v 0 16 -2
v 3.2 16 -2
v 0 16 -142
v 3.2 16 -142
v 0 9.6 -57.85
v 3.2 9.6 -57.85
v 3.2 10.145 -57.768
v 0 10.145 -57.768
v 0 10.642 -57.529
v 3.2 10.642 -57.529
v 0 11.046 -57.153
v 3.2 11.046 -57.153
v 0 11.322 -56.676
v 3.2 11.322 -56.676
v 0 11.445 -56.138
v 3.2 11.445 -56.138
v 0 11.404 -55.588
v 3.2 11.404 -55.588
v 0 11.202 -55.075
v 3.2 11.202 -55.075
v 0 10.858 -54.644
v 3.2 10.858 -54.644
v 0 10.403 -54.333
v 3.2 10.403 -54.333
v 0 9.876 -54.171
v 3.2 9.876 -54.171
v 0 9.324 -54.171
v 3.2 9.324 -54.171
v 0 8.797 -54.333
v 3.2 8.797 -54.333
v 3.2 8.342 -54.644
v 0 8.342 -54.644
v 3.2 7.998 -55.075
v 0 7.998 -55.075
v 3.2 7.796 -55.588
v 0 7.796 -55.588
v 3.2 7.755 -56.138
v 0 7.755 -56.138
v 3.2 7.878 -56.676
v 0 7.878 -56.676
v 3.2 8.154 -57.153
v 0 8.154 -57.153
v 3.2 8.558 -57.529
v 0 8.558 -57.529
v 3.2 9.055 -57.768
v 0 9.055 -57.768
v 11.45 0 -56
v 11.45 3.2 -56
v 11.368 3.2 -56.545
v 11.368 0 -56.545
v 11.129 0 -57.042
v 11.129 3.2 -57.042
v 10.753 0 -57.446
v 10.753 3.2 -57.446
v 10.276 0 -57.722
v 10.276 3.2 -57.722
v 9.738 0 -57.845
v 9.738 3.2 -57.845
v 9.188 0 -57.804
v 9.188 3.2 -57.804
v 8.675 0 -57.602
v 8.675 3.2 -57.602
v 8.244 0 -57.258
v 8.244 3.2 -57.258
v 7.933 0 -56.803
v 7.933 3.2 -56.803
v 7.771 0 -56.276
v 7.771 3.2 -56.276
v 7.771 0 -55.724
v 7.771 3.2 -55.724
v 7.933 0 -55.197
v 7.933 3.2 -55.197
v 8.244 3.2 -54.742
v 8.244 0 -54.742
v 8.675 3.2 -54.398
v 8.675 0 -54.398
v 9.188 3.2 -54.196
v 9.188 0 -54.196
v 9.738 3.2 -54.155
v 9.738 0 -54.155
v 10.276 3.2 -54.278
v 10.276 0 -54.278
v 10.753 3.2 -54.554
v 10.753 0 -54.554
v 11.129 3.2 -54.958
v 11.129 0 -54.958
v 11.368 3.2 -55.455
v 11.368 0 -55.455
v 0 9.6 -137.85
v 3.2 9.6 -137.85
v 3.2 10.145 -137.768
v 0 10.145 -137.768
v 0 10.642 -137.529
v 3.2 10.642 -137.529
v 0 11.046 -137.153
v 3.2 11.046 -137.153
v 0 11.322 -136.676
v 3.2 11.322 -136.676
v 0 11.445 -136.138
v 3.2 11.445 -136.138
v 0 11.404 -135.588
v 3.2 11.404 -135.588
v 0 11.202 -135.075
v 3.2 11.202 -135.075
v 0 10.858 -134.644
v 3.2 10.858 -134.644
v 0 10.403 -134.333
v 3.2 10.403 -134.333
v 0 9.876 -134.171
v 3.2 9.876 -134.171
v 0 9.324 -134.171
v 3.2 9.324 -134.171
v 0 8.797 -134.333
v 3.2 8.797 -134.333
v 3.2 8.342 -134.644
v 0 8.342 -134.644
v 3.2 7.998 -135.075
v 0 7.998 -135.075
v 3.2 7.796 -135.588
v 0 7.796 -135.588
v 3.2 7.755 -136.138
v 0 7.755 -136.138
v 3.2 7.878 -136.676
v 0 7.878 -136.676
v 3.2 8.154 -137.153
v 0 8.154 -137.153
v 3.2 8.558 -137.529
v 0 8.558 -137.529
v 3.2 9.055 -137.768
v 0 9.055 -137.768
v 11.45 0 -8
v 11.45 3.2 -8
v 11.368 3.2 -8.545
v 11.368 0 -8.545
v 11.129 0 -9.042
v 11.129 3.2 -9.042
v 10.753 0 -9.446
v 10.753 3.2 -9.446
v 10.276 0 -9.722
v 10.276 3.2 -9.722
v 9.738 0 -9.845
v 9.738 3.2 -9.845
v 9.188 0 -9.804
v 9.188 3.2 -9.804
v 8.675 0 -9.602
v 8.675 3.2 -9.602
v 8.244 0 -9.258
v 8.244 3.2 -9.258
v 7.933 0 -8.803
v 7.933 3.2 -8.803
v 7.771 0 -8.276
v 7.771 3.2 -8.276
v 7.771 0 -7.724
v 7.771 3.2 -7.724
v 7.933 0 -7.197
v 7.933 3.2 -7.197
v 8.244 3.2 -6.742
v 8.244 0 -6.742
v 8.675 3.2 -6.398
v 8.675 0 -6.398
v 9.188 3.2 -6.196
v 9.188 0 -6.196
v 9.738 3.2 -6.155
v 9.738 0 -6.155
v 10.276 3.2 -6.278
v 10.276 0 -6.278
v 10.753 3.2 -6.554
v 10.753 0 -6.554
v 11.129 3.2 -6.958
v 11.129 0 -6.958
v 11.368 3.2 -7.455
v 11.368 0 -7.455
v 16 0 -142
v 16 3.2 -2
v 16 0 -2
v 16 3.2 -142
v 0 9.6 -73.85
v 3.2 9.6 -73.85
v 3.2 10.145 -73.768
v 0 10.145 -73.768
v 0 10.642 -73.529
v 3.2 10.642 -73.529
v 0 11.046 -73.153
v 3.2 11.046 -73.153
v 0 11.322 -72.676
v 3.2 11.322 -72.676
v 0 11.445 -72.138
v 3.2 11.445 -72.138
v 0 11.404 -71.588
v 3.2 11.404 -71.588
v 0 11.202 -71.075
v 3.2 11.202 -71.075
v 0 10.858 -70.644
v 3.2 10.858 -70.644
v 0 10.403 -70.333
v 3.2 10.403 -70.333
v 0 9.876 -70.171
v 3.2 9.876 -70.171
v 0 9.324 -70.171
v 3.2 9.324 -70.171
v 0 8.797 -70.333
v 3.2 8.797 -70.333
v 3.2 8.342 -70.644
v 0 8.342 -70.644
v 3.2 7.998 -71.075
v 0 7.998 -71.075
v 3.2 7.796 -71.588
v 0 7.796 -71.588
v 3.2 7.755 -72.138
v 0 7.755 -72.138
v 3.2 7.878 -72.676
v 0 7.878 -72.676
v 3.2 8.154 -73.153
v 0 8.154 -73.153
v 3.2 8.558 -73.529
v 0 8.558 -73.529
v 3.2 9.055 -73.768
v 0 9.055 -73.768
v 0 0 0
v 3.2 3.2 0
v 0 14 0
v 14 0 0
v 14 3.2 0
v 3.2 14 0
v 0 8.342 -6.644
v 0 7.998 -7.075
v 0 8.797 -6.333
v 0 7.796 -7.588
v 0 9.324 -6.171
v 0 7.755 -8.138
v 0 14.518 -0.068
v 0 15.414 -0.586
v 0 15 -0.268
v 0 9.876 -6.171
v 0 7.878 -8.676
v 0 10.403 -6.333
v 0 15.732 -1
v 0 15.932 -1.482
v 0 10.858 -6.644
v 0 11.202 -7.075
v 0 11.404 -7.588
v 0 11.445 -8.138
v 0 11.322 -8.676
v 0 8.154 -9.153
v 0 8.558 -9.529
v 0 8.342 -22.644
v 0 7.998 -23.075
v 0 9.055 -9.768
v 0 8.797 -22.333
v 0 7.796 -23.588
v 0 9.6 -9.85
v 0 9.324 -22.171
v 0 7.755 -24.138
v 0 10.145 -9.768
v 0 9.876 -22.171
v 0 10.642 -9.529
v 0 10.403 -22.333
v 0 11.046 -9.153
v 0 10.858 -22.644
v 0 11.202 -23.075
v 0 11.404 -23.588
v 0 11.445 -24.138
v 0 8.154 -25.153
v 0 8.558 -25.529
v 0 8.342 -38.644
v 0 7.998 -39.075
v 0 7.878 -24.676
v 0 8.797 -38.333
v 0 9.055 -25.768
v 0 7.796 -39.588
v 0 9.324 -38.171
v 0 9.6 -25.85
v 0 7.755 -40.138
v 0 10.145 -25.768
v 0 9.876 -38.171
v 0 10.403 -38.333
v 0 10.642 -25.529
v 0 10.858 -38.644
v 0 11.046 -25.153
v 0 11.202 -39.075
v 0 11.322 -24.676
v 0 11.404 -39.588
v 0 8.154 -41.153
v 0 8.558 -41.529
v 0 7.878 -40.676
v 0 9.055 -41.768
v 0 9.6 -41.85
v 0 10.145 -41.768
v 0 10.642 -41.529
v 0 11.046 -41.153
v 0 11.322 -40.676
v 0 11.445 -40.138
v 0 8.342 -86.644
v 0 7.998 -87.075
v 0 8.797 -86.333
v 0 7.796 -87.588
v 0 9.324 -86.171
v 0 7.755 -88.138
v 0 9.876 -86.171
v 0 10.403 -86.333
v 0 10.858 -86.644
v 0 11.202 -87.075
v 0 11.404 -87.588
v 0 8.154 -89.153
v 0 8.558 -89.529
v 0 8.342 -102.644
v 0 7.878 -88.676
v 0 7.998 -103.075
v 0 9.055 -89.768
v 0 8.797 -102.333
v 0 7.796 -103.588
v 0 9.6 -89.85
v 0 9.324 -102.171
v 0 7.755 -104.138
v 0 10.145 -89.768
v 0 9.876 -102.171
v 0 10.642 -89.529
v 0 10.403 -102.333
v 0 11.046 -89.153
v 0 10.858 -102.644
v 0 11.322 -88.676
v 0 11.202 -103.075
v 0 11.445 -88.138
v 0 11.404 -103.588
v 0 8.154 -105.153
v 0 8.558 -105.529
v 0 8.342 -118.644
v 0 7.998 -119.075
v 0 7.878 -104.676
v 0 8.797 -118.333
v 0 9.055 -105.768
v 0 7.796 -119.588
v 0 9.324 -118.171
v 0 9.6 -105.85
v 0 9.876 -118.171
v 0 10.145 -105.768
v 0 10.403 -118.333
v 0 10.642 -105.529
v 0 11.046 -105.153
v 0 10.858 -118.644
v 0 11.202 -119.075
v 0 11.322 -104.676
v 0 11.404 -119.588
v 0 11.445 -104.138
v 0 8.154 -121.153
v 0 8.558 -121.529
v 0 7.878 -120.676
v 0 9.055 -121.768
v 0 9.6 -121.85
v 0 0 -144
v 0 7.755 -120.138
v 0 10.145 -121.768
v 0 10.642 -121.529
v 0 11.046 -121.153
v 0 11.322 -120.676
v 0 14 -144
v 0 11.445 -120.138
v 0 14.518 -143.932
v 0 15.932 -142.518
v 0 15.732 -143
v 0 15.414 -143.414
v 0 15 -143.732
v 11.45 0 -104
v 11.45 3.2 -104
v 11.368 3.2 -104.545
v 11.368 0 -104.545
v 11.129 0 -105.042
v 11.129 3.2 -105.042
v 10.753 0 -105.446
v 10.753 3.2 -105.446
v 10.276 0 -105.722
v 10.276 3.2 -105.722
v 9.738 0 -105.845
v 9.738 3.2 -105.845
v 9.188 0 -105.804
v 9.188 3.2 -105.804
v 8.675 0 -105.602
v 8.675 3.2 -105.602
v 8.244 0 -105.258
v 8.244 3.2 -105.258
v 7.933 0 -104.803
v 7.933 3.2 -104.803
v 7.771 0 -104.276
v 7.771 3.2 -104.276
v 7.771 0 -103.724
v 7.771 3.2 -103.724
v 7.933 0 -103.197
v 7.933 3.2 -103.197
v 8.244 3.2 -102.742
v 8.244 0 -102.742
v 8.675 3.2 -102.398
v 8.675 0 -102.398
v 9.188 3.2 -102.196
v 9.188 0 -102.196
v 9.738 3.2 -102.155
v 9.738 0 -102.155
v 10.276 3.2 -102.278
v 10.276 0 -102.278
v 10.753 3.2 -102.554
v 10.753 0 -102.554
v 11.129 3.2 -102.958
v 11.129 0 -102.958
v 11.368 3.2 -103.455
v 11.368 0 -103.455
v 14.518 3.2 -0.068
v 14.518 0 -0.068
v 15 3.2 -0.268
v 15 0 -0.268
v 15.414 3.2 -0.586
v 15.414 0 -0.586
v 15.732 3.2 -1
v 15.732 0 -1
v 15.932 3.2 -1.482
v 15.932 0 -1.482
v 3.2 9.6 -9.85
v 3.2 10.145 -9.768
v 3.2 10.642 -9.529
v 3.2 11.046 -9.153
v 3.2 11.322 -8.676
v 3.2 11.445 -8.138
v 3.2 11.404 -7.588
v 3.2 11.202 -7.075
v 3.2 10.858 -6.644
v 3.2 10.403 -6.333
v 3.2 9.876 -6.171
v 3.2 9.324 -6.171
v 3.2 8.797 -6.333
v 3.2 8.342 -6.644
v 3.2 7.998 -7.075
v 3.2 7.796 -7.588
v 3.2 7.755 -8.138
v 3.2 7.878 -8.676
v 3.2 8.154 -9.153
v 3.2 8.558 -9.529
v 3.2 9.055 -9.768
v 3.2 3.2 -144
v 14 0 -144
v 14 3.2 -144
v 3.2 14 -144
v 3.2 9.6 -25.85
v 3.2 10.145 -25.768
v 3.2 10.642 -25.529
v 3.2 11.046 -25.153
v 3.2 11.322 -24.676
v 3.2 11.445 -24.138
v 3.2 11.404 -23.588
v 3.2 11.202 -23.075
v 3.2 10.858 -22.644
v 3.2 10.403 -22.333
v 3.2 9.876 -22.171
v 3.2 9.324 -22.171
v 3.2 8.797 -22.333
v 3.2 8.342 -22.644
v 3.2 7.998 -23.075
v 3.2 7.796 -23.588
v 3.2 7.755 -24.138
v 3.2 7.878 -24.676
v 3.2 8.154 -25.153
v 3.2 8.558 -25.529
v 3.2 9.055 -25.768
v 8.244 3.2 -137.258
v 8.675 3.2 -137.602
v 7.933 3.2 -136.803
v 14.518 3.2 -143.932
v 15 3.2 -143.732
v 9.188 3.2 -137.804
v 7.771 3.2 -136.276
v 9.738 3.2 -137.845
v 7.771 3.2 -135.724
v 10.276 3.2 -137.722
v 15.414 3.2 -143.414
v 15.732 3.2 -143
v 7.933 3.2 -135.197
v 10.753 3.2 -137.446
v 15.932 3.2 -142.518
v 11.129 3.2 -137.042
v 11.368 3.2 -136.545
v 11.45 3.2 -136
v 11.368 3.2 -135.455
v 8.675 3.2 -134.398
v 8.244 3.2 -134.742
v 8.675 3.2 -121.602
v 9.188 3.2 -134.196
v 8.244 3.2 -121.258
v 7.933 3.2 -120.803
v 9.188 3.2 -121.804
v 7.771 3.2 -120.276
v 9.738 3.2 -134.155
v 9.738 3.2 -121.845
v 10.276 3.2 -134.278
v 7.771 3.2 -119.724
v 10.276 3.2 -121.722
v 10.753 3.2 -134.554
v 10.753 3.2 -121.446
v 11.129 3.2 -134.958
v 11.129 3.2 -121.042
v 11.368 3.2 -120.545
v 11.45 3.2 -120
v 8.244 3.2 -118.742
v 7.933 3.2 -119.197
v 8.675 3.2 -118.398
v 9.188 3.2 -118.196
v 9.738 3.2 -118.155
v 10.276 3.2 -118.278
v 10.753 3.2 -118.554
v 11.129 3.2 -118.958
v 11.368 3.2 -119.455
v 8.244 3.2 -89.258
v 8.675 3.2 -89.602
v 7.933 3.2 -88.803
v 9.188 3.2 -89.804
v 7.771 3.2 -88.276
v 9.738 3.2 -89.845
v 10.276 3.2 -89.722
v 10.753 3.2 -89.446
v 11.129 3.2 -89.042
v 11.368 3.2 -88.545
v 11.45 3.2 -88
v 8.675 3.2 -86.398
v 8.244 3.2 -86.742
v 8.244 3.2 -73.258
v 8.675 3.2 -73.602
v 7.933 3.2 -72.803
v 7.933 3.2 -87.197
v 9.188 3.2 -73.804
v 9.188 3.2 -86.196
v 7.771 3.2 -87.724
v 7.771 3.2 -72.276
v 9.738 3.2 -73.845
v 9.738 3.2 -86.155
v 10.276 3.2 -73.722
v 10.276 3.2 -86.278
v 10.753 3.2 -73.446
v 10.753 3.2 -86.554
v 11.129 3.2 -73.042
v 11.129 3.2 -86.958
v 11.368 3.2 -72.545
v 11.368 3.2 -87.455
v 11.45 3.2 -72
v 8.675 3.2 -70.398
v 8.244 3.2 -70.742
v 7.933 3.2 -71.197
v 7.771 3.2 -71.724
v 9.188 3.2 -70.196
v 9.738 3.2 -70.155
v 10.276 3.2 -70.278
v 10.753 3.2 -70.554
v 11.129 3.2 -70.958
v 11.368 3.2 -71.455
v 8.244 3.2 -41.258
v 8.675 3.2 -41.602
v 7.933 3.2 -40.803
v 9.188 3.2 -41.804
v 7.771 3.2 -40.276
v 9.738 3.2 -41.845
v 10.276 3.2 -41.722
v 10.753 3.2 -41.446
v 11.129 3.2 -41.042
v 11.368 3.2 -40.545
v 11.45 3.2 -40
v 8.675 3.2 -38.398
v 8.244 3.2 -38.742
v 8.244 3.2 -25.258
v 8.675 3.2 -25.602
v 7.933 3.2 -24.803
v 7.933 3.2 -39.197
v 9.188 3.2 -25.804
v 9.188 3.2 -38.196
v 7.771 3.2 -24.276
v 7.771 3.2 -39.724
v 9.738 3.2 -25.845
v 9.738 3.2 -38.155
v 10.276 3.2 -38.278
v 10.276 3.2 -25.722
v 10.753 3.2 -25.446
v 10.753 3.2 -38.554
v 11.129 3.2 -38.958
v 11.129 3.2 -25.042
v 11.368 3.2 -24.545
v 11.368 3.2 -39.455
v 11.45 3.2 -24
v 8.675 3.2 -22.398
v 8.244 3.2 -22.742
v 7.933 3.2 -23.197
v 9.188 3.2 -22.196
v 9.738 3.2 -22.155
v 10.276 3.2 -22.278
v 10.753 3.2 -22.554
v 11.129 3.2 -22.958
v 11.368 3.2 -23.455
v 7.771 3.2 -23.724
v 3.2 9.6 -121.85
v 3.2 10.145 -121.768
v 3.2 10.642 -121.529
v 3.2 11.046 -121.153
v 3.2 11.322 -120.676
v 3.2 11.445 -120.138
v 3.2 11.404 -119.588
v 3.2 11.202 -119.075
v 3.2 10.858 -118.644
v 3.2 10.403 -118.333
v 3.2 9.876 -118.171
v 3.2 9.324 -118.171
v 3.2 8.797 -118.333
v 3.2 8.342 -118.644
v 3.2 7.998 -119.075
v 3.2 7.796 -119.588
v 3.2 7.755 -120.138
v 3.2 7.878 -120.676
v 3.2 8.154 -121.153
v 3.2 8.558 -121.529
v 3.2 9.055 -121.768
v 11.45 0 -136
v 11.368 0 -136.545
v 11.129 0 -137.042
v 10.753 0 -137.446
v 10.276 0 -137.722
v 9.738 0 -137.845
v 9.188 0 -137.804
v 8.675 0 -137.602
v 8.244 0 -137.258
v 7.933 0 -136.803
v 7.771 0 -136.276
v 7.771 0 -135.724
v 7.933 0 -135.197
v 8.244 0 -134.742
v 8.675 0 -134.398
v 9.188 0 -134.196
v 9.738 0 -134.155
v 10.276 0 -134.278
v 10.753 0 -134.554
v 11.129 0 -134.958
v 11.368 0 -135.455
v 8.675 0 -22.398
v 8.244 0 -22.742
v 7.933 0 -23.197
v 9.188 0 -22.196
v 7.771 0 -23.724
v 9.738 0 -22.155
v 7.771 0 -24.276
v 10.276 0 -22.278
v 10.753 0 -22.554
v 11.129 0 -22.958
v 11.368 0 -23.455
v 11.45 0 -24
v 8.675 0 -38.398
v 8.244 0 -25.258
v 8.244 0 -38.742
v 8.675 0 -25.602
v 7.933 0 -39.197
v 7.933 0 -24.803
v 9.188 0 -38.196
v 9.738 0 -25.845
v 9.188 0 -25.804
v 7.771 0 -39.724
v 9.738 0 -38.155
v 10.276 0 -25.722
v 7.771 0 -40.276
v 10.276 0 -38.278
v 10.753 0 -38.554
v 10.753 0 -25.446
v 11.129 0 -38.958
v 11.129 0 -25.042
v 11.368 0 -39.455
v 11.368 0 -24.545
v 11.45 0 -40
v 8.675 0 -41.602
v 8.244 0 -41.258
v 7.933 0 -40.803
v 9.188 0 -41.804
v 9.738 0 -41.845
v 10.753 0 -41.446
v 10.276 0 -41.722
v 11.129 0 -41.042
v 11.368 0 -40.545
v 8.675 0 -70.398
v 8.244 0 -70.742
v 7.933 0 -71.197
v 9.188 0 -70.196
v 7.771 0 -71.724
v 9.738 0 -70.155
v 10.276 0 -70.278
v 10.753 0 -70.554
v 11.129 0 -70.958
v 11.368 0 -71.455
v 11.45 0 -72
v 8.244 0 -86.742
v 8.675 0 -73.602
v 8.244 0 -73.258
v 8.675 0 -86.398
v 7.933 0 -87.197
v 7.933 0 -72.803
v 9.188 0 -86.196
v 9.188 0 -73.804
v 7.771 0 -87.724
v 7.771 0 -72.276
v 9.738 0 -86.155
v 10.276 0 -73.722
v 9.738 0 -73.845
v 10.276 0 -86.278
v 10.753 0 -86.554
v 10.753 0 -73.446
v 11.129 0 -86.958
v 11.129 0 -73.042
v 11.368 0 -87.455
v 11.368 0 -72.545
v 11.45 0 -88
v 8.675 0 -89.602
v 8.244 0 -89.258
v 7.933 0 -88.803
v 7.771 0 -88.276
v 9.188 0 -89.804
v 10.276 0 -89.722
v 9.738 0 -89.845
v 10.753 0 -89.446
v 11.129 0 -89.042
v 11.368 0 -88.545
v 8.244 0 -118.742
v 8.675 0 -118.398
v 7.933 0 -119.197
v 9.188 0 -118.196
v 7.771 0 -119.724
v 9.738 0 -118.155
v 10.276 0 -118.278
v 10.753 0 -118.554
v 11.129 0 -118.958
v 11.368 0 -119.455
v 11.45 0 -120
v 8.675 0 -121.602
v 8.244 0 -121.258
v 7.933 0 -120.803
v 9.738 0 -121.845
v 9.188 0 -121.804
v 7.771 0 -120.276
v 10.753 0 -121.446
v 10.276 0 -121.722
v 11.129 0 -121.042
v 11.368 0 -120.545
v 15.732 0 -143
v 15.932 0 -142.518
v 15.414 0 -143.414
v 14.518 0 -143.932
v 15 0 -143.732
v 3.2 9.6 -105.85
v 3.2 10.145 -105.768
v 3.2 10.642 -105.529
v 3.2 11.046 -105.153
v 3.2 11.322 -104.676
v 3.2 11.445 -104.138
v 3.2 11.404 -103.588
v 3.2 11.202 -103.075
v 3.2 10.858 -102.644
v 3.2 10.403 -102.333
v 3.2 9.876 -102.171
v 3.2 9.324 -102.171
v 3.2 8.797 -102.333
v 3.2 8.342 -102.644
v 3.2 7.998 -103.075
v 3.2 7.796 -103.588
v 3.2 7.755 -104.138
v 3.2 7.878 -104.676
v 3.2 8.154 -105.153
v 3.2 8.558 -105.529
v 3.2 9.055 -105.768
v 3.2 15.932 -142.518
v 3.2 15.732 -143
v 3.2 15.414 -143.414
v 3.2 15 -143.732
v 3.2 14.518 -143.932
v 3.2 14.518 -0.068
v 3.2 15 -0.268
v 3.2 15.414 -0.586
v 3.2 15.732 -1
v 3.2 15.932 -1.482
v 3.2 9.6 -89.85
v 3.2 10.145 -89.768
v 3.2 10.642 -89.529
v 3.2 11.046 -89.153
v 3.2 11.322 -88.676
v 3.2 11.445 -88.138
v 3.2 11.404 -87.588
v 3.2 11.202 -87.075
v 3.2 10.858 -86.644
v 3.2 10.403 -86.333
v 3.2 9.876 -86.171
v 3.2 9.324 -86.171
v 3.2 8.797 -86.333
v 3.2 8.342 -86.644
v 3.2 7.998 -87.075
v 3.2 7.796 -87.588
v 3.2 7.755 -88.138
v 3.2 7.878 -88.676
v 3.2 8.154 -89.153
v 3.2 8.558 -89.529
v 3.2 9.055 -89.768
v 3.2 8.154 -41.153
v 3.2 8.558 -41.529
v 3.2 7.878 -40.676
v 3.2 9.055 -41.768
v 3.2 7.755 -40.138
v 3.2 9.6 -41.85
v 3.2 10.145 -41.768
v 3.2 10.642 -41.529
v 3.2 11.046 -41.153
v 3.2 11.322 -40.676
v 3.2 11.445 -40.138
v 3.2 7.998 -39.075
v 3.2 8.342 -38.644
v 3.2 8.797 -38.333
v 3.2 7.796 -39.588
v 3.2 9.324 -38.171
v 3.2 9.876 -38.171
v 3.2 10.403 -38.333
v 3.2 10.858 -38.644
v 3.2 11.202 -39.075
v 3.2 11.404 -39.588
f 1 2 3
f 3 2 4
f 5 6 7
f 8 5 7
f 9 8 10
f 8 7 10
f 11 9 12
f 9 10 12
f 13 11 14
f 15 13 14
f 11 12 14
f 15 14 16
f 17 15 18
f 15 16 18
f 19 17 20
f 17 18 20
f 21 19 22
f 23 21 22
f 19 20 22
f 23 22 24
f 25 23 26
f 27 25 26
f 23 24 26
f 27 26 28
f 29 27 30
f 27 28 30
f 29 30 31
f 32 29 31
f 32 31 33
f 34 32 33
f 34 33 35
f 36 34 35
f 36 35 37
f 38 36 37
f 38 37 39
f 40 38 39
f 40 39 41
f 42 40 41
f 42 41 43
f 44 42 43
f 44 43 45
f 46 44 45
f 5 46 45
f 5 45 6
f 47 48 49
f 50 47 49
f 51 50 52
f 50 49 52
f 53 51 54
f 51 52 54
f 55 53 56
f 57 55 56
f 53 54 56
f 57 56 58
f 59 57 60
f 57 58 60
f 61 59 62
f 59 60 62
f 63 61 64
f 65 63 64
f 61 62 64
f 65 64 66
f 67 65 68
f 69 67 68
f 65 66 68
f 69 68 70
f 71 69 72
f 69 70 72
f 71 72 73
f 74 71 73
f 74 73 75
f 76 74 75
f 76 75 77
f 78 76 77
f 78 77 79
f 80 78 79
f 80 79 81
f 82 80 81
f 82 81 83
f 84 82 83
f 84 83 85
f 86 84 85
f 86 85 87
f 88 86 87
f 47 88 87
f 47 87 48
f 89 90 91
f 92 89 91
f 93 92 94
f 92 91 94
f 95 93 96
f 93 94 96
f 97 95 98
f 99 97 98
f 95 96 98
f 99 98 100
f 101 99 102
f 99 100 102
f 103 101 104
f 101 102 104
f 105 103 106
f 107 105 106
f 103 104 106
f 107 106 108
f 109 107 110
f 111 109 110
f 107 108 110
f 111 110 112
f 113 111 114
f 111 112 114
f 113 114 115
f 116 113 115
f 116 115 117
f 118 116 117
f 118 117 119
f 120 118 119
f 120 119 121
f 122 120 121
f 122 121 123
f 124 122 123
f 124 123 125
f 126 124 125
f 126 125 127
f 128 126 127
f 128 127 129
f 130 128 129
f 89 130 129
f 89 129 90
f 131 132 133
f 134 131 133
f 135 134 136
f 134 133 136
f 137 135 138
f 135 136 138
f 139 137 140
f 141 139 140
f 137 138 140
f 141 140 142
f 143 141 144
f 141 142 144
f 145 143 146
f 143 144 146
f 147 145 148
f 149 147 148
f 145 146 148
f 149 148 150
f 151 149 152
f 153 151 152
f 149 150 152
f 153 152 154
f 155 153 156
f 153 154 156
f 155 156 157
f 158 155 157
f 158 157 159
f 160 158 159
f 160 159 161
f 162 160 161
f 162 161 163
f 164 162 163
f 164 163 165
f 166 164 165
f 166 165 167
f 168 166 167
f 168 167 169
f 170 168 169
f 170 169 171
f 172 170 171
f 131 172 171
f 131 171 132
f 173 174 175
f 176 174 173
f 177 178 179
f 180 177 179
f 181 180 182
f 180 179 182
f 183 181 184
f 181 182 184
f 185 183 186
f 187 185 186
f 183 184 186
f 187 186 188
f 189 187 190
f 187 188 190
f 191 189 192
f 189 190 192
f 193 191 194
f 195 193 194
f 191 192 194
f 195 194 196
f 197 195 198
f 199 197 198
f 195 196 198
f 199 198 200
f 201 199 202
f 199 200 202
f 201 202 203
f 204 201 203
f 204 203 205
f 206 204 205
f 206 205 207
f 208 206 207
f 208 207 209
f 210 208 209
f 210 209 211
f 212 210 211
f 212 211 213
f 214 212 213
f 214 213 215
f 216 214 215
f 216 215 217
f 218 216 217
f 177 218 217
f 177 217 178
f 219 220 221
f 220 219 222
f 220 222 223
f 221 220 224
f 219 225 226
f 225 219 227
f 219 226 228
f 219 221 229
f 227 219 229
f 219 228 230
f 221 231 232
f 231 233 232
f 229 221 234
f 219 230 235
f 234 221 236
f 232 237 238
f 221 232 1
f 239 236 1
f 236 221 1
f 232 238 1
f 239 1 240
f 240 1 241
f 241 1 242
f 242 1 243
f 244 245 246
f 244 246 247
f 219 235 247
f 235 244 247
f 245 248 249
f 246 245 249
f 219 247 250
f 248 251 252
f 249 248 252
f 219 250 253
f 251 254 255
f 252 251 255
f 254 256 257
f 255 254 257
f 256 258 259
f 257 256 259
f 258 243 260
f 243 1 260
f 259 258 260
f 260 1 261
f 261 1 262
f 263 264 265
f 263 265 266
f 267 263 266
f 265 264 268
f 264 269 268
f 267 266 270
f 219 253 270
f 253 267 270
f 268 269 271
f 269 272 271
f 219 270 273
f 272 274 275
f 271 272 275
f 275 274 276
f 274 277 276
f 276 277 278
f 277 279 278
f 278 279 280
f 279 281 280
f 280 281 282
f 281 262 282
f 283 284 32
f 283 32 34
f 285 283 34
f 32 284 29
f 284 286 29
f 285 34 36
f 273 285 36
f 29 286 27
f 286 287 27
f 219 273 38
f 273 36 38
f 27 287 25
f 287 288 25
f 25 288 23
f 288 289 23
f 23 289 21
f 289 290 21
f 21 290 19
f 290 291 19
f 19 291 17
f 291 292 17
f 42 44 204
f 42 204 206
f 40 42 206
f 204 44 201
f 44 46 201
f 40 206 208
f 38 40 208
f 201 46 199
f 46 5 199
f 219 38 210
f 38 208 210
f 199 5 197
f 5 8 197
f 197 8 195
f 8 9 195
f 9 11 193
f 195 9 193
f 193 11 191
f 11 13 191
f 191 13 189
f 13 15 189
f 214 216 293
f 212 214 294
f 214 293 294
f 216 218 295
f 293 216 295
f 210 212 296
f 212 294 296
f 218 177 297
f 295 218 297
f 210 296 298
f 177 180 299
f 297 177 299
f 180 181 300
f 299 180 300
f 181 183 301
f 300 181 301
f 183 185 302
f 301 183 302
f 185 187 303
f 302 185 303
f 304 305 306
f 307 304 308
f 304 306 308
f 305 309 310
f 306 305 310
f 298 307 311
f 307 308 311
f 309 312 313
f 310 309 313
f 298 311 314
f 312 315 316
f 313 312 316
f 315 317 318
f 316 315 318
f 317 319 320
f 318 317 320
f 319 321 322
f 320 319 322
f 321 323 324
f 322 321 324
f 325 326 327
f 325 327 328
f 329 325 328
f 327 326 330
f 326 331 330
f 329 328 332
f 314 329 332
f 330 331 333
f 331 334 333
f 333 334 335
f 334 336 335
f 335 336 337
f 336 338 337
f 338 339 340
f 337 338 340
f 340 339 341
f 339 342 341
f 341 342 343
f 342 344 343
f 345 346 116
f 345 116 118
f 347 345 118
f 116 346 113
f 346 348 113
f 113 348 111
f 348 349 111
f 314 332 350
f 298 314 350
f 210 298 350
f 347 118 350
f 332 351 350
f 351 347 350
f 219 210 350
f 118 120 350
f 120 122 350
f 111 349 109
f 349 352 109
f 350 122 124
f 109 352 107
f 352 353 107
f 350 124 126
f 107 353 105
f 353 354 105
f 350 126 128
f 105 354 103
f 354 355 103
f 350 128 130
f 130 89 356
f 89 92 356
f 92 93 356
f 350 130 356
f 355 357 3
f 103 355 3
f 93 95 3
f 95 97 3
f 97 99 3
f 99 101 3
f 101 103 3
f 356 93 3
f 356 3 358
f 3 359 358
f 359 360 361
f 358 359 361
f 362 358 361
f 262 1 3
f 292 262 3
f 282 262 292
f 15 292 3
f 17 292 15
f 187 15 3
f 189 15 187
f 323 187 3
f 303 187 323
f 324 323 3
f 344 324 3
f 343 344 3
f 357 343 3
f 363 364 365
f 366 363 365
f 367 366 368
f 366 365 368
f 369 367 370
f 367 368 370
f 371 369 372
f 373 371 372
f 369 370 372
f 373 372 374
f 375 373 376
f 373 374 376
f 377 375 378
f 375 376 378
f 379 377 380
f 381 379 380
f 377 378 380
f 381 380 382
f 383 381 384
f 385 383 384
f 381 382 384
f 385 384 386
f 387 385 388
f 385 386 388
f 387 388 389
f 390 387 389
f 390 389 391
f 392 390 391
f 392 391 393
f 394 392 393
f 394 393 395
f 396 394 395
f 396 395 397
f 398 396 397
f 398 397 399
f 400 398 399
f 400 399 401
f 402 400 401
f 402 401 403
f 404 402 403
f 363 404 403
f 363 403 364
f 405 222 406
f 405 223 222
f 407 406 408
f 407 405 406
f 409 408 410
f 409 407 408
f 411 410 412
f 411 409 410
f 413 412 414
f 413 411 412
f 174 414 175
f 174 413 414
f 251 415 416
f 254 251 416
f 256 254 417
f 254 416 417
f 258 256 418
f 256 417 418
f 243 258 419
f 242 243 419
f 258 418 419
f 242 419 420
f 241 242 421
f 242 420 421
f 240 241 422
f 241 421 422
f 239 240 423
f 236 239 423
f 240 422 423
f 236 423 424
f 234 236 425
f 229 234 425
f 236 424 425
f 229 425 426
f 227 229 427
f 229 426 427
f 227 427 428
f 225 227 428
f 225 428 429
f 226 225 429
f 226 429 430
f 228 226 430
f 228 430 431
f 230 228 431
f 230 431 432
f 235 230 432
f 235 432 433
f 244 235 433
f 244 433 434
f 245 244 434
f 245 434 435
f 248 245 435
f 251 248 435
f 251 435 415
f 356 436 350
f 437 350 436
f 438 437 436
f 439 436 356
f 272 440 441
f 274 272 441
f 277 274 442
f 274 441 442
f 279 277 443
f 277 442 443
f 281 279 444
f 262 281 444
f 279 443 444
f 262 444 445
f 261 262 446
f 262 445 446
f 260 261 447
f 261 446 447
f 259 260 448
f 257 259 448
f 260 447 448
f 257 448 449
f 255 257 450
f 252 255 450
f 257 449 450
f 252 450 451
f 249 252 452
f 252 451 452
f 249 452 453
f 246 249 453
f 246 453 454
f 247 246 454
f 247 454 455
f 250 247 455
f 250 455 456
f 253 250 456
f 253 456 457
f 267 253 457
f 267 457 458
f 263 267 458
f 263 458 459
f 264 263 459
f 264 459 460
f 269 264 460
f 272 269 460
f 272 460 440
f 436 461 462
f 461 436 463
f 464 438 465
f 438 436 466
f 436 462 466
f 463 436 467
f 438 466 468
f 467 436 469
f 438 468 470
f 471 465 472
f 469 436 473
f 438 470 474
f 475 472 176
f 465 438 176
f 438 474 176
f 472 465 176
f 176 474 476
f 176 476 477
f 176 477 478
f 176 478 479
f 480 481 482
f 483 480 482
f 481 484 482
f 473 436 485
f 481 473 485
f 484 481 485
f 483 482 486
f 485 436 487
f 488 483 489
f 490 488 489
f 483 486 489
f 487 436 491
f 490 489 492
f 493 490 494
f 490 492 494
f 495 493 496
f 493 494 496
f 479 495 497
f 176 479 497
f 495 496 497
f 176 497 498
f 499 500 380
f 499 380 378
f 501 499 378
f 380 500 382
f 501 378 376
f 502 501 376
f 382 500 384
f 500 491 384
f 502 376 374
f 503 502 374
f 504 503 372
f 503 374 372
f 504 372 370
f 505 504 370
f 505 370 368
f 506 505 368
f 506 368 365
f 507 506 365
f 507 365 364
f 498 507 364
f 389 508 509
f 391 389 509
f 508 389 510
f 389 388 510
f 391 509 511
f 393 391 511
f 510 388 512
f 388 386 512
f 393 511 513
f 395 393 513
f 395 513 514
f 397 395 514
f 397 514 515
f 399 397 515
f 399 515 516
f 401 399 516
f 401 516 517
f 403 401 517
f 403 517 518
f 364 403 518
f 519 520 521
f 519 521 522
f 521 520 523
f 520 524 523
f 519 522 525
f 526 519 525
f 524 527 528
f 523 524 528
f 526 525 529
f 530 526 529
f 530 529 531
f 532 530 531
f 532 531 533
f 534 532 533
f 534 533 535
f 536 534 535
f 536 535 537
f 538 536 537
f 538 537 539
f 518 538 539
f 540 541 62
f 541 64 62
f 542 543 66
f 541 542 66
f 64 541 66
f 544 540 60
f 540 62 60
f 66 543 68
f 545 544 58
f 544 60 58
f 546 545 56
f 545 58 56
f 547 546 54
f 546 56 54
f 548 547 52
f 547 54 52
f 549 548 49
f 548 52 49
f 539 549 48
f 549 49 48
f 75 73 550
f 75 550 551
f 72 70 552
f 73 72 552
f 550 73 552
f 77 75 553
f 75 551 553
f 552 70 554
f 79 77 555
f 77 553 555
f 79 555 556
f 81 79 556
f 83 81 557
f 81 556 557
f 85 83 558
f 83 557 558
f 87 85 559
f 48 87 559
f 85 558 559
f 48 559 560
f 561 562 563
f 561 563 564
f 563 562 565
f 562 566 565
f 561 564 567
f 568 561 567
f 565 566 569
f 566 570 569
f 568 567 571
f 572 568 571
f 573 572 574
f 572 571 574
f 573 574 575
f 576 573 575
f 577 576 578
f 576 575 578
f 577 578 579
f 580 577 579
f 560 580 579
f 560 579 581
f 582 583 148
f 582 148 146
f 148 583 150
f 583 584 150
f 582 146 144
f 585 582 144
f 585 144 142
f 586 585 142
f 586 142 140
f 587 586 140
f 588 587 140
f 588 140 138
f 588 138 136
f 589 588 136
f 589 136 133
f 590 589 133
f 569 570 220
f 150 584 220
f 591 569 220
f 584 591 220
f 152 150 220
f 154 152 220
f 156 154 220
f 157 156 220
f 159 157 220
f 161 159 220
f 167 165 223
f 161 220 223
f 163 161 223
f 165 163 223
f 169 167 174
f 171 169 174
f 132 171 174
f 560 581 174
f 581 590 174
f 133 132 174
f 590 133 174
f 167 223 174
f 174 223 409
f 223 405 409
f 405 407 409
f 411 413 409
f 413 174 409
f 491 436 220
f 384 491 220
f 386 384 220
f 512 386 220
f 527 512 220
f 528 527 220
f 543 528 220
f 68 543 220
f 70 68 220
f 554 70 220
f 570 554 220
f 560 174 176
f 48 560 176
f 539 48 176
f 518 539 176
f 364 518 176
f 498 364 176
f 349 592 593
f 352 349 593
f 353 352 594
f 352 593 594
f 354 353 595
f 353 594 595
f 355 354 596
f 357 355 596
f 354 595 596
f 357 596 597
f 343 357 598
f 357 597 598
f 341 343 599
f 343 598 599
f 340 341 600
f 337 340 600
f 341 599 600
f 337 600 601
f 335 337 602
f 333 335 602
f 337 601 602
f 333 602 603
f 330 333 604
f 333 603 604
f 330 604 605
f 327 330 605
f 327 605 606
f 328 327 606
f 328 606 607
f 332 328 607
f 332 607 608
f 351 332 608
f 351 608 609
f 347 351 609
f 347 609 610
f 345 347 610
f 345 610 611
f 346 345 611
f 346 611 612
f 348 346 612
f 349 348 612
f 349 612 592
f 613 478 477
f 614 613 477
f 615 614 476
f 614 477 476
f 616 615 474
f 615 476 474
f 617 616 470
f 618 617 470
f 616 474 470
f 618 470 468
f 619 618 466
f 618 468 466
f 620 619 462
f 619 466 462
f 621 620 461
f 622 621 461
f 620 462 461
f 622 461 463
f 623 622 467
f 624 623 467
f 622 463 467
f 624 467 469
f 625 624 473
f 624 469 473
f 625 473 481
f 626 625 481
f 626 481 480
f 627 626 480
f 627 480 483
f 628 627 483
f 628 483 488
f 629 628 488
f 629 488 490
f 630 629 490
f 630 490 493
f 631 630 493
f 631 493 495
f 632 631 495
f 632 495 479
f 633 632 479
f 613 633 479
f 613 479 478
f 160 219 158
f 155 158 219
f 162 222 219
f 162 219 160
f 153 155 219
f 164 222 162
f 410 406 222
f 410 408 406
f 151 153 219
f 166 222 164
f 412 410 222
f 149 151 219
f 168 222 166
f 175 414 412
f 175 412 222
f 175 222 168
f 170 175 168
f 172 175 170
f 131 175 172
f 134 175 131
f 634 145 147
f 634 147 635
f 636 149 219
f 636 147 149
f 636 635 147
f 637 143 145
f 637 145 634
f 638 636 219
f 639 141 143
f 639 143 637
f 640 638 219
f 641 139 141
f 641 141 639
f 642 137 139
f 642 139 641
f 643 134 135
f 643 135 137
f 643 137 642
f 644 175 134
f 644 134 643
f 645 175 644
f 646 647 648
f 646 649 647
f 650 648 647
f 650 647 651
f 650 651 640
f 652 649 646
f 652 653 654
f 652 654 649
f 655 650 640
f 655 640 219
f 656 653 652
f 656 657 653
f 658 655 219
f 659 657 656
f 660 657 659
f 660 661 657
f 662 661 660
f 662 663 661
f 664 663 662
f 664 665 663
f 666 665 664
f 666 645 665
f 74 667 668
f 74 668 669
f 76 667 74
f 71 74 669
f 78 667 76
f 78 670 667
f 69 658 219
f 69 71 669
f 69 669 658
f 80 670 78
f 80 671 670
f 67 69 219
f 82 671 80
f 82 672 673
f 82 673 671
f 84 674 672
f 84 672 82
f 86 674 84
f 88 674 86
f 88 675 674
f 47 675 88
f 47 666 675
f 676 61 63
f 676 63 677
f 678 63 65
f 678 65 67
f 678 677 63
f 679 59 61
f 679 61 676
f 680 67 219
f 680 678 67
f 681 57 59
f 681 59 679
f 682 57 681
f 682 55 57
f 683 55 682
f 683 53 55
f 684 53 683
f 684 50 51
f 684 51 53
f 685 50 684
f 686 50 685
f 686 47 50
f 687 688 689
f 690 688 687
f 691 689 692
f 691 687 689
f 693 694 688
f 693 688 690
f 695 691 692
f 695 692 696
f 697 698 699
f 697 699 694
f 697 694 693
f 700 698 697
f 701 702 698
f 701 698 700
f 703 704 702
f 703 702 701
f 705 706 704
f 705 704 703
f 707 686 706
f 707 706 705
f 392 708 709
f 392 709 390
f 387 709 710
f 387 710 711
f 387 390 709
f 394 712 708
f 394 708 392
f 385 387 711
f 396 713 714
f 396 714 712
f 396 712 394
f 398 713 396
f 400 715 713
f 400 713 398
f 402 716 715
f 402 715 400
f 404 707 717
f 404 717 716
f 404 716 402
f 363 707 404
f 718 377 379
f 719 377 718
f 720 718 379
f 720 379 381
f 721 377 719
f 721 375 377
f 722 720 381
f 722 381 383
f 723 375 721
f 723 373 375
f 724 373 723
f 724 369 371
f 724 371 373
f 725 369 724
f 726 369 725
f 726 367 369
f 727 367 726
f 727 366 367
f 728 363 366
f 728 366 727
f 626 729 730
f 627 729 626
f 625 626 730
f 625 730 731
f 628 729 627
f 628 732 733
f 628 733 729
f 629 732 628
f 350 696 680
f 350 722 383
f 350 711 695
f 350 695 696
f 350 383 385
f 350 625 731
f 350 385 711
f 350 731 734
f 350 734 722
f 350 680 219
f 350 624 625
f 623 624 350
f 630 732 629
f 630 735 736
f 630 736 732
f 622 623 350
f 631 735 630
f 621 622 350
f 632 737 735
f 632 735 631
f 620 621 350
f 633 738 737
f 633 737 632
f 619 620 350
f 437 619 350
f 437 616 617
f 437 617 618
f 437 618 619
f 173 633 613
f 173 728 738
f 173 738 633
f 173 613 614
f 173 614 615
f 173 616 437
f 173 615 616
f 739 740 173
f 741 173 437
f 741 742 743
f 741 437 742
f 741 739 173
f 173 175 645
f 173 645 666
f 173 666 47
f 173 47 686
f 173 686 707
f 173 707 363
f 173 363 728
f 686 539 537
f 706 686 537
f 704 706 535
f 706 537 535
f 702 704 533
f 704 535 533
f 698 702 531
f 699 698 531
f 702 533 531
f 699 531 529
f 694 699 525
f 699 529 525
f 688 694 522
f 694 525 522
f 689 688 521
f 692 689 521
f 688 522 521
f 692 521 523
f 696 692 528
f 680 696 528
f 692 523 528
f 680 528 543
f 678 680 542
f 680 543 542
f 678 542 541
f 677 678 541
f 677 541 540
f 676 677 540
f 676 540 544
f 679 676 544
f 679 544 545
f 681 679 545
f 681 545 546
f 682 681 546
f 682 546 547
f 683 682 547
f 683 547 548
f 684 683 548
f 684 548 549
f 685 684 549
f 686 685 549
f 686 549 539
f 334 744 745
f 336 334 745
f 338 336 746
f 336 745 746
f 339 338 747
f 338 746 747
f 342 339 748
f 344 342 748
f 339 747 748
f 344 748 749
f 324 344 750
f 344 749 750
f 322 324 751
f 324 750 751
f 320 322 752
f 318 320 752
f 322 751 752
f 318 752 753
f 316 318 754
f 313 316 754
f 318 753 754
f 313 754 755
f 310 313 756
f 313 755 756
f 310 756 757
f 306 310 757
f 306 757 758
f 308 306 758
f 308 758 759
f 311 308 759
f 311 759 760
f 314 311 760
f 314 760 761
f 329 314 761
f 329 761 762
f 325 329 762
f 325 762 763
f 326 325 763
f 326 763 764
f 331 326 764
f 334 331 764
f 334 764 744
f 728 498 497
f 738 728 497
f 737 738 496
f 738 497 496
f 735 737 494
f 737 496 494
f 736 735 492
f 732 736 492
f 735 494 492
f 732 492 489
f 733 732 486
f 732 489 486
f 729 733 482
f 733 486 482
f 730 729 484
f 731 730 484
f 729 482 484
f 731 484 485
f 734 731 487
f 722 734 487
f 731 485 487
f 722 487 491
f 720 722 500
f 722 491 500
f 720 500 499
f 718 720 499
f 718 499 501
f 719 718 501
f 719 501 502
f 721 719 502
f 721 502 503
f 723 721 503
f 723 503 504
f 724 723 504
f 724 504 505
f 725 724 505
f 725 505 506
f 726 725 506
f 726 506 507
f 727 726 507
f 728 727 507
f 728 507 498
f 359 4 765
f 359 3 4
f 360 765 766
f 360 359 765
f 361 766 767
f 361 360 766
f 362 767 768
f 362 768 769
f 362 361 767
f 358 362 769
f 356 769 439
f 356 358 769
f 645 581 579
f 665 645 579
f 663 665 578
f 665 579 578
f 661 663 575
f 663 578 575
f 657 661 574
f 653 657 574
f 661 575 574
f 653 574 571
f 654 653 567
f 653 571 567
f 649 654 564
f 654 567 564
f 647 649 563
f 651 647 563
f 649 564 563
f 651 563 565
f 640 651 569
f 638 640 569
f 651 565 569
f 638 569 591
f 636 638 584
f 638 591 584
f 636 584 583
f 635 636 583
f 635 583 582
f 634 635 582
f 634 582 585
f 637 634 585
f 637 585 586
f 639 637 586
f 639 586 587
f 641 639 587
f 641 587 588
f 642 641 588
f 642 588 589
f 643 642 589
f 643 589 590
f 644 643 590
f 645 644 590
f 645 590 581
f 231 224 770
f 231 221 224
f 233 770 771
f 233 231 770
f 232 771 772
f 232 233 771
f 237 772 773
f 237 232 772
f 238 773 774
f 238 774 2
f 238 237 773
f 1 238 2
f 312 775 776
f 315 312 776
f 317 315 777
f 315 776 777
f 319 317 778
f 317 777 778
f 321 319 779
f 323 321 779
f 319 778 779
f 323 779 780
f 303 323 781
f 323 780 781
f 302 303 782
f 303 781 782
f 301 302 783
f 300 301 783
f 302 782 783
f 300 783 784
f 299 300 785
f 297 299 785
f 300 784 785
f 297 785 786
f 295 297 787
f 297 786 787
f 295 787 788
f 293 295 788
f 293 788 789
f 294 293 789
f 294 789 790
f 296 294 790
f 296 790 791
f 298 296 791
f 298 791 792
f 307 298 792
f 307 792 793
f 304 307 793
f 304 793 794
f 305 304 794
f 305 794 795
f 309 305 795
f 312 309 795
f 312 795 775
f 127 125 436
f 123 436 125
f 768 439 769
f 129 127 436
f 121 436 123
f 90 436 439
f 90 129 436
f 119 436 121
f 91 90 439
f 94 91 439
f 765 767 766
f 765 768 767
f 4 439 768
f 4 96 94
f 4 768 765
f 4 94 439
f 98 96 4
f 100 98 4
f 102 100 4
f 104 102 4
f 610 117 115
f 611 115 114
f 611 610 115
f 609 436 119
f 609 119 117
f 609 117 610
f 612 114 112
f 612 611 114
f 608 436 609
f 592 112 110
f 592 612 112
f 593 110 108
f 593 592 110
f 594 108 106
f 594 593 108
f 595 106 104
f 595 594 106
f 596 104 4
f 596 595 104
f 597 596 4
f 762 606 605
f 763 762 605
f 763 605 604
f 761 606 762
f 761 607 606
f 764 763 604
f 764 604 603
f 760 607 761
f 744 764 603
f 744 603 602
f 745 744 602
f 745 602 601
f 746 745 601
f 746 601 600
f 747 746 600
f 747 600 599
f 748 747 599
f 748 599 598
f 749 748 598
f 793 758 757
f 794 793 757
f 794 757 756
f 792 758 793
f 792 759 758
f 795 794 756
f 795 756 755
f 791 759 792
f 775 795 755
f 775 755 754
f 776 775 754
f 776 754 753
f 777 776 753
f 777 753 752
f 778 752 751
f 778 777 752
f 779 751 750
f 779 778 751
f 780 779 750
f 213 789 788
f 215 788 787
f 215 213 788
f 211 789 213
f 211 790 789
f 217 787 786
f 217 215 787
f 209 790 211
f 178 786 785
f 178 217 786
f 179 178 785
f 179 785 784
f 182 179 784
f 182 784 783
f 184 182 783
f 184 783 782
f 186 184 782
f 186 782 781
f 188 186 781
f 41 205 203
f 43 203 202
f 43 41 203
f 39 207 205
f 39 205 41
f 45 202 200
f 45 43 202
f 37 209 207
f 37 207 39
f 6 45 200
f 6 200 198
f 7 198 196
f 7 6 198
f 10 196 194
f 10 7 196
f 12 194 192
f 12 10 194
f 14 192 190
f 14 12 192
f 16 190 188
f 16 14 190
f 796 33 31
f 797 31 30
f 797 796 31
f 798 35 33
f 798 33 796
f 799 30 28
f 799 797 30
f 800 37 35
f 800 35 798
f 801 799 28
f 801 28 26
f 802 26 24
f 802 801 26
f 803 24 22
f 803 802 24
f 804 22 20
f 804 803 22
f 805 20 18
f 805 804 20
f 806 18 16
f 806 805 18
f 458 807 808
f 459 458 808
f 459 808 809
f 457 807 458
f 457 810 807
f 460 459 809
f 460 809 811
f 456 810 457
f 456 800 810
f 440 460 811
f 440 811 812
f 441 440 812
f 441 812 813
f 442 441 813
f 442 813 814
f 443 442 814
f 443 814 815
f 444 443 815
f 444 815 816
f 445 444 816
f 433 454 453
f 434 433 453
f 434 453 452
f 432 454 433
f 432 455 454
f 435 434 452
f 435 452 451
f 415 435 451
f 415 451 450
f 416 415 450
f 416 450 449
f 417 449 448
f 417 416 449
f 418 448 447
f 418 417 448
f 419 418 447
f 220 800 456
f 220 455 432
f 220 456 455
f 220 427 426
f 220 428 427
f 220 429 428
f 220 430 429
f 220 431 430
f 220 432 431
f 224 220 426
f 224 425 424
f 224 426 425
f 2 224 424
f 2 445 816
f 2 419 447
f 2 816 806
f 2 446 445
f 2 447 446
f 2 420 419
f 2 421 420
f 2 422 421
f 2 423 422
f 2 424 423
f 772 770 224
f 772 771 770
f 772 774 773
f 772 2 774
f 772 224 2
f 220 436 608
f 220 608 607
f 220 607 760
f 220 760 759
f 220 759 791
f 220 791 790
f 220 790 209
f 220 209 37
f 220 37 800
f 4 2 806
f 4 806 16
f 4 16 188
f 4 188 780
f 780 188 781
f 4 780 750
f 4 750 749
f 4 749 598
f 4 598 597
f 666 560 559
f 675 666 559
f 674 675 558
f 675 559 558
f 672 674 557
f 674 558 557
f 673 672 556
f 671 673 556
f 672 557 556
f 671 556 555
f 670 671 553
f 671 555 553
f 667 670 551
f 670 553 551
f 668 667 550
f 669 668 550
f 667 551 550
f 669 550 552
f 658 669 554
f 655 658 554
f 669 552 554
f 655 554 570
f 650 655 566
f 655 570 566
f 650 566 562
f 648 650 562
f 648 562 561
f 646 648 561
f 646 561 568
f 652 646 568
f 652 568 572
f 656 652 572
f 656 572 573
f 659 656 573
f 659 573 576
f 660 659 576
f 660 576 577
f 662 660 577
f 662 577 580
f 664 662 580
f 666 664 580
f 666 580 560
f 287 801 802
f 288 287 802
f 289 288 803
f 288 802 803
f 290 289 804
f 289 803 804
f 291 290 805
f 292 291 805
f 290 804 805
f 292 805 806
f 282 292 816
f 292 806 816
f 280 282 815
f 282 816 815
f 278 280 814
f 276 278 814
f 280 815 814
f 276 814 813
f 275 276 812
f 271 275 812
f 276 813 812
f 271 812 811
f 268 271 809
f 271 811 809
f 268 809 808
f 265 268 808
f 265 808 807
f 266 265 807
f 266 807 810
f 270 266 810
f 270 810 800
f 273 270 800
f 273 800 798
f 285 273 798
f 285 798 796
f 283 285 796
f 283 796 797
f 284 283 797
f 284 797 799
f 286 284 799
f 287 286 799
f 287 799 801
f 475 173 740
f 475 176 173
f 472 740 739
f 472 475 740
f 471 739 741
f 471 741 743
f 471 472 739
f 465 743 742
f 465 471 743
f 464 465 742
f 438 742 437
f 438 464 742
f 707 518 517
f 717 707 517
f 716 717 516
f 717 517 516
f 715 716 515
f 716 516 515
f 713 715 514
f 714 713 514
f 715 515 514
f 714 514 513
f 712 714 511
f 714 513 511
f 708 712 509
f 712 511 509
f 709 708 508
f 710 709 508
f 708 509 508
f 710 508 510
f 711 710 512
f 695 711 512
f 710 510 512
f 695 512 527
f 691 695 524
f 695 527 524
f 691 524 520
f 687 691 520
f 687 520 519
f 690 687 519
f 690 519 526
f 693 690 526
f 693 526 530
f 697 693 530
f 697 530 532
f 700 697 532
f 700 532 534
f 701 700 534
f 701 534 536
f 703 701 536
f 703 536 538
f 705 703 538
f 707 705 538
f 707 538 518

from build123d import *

# Parameters (mm, degrees)
SKETCH1_W                      = 144
SKETCH1_H                      = 16
BOSS_EXTRUDE1_DEPTH            = 16
SKETCH2_W                      = 12.8
SKETCH2_H                      = 12.8
CUT_EXTRUDE1_DEPTH             = 145
F_3_7_3_7_DIAMETER_HOLE1_D     = 3.7
F_3_7_3_7_DIAMETER_HOLE1_DEPTH = 16
F_3_7_3_7_DIAMETER_HOLE2_D     = 3.7
F_3_7_3_7_DIAMETER_HOLE2_DEPTH = 16
FILLET1_R                      = 2


with BuildPart() as part:
    # Sketch1 → Boss-Extrude1 (new body)
    with BuildSketch(Plane(origin=(16, 0, 0), x_dir=(0, 0, -1), z_dir=(1, 0, 0))):
        with Locations((72, 8)):
            Rectangle(SKETCH1_W, SKETCH1_H)
    extrude(amount=-BOSS_EXTRUDE1_DEPTH)

    # Sketch2 → Cut-Extrude1 (cut, through all)
    with BuildSketch(Plane.XY):
        with Locations((9.6, 9.6)):
            Rectangle(SKETCH2_W, SKETCH2_H)
    extrude(amount=-CUT_EXTRUDE1_DEPTH, mode=Mode.SUBTRACT)

    # Ø3.7 (3.7) Diameter Hole1
    with Locations(Plane.ZY):
        with Locations((-24, 9.6), (-40, 9.6), (-56, 9.6), (-72, 9.6), (-88, 9.6), (-104, 9.6), (-120, 9.6), (-136, 9.6), (-8, 9.6)):
            Hole(F_3_7_3_7_DIAMETER_HOLE1_D / 2, depth=F_3_7_3_7_DIAMETER_HOLE1_DEPTH)

    # Ø3.7 (3.7) Diameter Hole2
    with Locations(Plane(origin=(0, 0, 0), x_dir=(-1, 0, 0), z_dir=(0, -1, 0))):
        with Locations((-9.6, 24), (-9.6, 40), (-9.6, 56), (-9.6, 72), (-9.6, 88), (-9.6, 104), (-9.6, 120), (-9.6, 136), (-9.6, 8)):
            Hole(F_3_7_3_7_DIAMETER_HOLE2_D / 2, depth=F_3_7_3_7_DIAMETER_HOLE2_DEPTH)

    # Fillet1
    fillet1_edges = [part.edges().sort_by_distance(p)[0] for p in [
        (16, 1.6, 0),
        (16, 1.6, -144),
        (1.6, 16, 0),
        (1.6, 16, -144),
    ]]
    fillet(fillet1_edges, radius=FILLET1_R)


solid = part.part
